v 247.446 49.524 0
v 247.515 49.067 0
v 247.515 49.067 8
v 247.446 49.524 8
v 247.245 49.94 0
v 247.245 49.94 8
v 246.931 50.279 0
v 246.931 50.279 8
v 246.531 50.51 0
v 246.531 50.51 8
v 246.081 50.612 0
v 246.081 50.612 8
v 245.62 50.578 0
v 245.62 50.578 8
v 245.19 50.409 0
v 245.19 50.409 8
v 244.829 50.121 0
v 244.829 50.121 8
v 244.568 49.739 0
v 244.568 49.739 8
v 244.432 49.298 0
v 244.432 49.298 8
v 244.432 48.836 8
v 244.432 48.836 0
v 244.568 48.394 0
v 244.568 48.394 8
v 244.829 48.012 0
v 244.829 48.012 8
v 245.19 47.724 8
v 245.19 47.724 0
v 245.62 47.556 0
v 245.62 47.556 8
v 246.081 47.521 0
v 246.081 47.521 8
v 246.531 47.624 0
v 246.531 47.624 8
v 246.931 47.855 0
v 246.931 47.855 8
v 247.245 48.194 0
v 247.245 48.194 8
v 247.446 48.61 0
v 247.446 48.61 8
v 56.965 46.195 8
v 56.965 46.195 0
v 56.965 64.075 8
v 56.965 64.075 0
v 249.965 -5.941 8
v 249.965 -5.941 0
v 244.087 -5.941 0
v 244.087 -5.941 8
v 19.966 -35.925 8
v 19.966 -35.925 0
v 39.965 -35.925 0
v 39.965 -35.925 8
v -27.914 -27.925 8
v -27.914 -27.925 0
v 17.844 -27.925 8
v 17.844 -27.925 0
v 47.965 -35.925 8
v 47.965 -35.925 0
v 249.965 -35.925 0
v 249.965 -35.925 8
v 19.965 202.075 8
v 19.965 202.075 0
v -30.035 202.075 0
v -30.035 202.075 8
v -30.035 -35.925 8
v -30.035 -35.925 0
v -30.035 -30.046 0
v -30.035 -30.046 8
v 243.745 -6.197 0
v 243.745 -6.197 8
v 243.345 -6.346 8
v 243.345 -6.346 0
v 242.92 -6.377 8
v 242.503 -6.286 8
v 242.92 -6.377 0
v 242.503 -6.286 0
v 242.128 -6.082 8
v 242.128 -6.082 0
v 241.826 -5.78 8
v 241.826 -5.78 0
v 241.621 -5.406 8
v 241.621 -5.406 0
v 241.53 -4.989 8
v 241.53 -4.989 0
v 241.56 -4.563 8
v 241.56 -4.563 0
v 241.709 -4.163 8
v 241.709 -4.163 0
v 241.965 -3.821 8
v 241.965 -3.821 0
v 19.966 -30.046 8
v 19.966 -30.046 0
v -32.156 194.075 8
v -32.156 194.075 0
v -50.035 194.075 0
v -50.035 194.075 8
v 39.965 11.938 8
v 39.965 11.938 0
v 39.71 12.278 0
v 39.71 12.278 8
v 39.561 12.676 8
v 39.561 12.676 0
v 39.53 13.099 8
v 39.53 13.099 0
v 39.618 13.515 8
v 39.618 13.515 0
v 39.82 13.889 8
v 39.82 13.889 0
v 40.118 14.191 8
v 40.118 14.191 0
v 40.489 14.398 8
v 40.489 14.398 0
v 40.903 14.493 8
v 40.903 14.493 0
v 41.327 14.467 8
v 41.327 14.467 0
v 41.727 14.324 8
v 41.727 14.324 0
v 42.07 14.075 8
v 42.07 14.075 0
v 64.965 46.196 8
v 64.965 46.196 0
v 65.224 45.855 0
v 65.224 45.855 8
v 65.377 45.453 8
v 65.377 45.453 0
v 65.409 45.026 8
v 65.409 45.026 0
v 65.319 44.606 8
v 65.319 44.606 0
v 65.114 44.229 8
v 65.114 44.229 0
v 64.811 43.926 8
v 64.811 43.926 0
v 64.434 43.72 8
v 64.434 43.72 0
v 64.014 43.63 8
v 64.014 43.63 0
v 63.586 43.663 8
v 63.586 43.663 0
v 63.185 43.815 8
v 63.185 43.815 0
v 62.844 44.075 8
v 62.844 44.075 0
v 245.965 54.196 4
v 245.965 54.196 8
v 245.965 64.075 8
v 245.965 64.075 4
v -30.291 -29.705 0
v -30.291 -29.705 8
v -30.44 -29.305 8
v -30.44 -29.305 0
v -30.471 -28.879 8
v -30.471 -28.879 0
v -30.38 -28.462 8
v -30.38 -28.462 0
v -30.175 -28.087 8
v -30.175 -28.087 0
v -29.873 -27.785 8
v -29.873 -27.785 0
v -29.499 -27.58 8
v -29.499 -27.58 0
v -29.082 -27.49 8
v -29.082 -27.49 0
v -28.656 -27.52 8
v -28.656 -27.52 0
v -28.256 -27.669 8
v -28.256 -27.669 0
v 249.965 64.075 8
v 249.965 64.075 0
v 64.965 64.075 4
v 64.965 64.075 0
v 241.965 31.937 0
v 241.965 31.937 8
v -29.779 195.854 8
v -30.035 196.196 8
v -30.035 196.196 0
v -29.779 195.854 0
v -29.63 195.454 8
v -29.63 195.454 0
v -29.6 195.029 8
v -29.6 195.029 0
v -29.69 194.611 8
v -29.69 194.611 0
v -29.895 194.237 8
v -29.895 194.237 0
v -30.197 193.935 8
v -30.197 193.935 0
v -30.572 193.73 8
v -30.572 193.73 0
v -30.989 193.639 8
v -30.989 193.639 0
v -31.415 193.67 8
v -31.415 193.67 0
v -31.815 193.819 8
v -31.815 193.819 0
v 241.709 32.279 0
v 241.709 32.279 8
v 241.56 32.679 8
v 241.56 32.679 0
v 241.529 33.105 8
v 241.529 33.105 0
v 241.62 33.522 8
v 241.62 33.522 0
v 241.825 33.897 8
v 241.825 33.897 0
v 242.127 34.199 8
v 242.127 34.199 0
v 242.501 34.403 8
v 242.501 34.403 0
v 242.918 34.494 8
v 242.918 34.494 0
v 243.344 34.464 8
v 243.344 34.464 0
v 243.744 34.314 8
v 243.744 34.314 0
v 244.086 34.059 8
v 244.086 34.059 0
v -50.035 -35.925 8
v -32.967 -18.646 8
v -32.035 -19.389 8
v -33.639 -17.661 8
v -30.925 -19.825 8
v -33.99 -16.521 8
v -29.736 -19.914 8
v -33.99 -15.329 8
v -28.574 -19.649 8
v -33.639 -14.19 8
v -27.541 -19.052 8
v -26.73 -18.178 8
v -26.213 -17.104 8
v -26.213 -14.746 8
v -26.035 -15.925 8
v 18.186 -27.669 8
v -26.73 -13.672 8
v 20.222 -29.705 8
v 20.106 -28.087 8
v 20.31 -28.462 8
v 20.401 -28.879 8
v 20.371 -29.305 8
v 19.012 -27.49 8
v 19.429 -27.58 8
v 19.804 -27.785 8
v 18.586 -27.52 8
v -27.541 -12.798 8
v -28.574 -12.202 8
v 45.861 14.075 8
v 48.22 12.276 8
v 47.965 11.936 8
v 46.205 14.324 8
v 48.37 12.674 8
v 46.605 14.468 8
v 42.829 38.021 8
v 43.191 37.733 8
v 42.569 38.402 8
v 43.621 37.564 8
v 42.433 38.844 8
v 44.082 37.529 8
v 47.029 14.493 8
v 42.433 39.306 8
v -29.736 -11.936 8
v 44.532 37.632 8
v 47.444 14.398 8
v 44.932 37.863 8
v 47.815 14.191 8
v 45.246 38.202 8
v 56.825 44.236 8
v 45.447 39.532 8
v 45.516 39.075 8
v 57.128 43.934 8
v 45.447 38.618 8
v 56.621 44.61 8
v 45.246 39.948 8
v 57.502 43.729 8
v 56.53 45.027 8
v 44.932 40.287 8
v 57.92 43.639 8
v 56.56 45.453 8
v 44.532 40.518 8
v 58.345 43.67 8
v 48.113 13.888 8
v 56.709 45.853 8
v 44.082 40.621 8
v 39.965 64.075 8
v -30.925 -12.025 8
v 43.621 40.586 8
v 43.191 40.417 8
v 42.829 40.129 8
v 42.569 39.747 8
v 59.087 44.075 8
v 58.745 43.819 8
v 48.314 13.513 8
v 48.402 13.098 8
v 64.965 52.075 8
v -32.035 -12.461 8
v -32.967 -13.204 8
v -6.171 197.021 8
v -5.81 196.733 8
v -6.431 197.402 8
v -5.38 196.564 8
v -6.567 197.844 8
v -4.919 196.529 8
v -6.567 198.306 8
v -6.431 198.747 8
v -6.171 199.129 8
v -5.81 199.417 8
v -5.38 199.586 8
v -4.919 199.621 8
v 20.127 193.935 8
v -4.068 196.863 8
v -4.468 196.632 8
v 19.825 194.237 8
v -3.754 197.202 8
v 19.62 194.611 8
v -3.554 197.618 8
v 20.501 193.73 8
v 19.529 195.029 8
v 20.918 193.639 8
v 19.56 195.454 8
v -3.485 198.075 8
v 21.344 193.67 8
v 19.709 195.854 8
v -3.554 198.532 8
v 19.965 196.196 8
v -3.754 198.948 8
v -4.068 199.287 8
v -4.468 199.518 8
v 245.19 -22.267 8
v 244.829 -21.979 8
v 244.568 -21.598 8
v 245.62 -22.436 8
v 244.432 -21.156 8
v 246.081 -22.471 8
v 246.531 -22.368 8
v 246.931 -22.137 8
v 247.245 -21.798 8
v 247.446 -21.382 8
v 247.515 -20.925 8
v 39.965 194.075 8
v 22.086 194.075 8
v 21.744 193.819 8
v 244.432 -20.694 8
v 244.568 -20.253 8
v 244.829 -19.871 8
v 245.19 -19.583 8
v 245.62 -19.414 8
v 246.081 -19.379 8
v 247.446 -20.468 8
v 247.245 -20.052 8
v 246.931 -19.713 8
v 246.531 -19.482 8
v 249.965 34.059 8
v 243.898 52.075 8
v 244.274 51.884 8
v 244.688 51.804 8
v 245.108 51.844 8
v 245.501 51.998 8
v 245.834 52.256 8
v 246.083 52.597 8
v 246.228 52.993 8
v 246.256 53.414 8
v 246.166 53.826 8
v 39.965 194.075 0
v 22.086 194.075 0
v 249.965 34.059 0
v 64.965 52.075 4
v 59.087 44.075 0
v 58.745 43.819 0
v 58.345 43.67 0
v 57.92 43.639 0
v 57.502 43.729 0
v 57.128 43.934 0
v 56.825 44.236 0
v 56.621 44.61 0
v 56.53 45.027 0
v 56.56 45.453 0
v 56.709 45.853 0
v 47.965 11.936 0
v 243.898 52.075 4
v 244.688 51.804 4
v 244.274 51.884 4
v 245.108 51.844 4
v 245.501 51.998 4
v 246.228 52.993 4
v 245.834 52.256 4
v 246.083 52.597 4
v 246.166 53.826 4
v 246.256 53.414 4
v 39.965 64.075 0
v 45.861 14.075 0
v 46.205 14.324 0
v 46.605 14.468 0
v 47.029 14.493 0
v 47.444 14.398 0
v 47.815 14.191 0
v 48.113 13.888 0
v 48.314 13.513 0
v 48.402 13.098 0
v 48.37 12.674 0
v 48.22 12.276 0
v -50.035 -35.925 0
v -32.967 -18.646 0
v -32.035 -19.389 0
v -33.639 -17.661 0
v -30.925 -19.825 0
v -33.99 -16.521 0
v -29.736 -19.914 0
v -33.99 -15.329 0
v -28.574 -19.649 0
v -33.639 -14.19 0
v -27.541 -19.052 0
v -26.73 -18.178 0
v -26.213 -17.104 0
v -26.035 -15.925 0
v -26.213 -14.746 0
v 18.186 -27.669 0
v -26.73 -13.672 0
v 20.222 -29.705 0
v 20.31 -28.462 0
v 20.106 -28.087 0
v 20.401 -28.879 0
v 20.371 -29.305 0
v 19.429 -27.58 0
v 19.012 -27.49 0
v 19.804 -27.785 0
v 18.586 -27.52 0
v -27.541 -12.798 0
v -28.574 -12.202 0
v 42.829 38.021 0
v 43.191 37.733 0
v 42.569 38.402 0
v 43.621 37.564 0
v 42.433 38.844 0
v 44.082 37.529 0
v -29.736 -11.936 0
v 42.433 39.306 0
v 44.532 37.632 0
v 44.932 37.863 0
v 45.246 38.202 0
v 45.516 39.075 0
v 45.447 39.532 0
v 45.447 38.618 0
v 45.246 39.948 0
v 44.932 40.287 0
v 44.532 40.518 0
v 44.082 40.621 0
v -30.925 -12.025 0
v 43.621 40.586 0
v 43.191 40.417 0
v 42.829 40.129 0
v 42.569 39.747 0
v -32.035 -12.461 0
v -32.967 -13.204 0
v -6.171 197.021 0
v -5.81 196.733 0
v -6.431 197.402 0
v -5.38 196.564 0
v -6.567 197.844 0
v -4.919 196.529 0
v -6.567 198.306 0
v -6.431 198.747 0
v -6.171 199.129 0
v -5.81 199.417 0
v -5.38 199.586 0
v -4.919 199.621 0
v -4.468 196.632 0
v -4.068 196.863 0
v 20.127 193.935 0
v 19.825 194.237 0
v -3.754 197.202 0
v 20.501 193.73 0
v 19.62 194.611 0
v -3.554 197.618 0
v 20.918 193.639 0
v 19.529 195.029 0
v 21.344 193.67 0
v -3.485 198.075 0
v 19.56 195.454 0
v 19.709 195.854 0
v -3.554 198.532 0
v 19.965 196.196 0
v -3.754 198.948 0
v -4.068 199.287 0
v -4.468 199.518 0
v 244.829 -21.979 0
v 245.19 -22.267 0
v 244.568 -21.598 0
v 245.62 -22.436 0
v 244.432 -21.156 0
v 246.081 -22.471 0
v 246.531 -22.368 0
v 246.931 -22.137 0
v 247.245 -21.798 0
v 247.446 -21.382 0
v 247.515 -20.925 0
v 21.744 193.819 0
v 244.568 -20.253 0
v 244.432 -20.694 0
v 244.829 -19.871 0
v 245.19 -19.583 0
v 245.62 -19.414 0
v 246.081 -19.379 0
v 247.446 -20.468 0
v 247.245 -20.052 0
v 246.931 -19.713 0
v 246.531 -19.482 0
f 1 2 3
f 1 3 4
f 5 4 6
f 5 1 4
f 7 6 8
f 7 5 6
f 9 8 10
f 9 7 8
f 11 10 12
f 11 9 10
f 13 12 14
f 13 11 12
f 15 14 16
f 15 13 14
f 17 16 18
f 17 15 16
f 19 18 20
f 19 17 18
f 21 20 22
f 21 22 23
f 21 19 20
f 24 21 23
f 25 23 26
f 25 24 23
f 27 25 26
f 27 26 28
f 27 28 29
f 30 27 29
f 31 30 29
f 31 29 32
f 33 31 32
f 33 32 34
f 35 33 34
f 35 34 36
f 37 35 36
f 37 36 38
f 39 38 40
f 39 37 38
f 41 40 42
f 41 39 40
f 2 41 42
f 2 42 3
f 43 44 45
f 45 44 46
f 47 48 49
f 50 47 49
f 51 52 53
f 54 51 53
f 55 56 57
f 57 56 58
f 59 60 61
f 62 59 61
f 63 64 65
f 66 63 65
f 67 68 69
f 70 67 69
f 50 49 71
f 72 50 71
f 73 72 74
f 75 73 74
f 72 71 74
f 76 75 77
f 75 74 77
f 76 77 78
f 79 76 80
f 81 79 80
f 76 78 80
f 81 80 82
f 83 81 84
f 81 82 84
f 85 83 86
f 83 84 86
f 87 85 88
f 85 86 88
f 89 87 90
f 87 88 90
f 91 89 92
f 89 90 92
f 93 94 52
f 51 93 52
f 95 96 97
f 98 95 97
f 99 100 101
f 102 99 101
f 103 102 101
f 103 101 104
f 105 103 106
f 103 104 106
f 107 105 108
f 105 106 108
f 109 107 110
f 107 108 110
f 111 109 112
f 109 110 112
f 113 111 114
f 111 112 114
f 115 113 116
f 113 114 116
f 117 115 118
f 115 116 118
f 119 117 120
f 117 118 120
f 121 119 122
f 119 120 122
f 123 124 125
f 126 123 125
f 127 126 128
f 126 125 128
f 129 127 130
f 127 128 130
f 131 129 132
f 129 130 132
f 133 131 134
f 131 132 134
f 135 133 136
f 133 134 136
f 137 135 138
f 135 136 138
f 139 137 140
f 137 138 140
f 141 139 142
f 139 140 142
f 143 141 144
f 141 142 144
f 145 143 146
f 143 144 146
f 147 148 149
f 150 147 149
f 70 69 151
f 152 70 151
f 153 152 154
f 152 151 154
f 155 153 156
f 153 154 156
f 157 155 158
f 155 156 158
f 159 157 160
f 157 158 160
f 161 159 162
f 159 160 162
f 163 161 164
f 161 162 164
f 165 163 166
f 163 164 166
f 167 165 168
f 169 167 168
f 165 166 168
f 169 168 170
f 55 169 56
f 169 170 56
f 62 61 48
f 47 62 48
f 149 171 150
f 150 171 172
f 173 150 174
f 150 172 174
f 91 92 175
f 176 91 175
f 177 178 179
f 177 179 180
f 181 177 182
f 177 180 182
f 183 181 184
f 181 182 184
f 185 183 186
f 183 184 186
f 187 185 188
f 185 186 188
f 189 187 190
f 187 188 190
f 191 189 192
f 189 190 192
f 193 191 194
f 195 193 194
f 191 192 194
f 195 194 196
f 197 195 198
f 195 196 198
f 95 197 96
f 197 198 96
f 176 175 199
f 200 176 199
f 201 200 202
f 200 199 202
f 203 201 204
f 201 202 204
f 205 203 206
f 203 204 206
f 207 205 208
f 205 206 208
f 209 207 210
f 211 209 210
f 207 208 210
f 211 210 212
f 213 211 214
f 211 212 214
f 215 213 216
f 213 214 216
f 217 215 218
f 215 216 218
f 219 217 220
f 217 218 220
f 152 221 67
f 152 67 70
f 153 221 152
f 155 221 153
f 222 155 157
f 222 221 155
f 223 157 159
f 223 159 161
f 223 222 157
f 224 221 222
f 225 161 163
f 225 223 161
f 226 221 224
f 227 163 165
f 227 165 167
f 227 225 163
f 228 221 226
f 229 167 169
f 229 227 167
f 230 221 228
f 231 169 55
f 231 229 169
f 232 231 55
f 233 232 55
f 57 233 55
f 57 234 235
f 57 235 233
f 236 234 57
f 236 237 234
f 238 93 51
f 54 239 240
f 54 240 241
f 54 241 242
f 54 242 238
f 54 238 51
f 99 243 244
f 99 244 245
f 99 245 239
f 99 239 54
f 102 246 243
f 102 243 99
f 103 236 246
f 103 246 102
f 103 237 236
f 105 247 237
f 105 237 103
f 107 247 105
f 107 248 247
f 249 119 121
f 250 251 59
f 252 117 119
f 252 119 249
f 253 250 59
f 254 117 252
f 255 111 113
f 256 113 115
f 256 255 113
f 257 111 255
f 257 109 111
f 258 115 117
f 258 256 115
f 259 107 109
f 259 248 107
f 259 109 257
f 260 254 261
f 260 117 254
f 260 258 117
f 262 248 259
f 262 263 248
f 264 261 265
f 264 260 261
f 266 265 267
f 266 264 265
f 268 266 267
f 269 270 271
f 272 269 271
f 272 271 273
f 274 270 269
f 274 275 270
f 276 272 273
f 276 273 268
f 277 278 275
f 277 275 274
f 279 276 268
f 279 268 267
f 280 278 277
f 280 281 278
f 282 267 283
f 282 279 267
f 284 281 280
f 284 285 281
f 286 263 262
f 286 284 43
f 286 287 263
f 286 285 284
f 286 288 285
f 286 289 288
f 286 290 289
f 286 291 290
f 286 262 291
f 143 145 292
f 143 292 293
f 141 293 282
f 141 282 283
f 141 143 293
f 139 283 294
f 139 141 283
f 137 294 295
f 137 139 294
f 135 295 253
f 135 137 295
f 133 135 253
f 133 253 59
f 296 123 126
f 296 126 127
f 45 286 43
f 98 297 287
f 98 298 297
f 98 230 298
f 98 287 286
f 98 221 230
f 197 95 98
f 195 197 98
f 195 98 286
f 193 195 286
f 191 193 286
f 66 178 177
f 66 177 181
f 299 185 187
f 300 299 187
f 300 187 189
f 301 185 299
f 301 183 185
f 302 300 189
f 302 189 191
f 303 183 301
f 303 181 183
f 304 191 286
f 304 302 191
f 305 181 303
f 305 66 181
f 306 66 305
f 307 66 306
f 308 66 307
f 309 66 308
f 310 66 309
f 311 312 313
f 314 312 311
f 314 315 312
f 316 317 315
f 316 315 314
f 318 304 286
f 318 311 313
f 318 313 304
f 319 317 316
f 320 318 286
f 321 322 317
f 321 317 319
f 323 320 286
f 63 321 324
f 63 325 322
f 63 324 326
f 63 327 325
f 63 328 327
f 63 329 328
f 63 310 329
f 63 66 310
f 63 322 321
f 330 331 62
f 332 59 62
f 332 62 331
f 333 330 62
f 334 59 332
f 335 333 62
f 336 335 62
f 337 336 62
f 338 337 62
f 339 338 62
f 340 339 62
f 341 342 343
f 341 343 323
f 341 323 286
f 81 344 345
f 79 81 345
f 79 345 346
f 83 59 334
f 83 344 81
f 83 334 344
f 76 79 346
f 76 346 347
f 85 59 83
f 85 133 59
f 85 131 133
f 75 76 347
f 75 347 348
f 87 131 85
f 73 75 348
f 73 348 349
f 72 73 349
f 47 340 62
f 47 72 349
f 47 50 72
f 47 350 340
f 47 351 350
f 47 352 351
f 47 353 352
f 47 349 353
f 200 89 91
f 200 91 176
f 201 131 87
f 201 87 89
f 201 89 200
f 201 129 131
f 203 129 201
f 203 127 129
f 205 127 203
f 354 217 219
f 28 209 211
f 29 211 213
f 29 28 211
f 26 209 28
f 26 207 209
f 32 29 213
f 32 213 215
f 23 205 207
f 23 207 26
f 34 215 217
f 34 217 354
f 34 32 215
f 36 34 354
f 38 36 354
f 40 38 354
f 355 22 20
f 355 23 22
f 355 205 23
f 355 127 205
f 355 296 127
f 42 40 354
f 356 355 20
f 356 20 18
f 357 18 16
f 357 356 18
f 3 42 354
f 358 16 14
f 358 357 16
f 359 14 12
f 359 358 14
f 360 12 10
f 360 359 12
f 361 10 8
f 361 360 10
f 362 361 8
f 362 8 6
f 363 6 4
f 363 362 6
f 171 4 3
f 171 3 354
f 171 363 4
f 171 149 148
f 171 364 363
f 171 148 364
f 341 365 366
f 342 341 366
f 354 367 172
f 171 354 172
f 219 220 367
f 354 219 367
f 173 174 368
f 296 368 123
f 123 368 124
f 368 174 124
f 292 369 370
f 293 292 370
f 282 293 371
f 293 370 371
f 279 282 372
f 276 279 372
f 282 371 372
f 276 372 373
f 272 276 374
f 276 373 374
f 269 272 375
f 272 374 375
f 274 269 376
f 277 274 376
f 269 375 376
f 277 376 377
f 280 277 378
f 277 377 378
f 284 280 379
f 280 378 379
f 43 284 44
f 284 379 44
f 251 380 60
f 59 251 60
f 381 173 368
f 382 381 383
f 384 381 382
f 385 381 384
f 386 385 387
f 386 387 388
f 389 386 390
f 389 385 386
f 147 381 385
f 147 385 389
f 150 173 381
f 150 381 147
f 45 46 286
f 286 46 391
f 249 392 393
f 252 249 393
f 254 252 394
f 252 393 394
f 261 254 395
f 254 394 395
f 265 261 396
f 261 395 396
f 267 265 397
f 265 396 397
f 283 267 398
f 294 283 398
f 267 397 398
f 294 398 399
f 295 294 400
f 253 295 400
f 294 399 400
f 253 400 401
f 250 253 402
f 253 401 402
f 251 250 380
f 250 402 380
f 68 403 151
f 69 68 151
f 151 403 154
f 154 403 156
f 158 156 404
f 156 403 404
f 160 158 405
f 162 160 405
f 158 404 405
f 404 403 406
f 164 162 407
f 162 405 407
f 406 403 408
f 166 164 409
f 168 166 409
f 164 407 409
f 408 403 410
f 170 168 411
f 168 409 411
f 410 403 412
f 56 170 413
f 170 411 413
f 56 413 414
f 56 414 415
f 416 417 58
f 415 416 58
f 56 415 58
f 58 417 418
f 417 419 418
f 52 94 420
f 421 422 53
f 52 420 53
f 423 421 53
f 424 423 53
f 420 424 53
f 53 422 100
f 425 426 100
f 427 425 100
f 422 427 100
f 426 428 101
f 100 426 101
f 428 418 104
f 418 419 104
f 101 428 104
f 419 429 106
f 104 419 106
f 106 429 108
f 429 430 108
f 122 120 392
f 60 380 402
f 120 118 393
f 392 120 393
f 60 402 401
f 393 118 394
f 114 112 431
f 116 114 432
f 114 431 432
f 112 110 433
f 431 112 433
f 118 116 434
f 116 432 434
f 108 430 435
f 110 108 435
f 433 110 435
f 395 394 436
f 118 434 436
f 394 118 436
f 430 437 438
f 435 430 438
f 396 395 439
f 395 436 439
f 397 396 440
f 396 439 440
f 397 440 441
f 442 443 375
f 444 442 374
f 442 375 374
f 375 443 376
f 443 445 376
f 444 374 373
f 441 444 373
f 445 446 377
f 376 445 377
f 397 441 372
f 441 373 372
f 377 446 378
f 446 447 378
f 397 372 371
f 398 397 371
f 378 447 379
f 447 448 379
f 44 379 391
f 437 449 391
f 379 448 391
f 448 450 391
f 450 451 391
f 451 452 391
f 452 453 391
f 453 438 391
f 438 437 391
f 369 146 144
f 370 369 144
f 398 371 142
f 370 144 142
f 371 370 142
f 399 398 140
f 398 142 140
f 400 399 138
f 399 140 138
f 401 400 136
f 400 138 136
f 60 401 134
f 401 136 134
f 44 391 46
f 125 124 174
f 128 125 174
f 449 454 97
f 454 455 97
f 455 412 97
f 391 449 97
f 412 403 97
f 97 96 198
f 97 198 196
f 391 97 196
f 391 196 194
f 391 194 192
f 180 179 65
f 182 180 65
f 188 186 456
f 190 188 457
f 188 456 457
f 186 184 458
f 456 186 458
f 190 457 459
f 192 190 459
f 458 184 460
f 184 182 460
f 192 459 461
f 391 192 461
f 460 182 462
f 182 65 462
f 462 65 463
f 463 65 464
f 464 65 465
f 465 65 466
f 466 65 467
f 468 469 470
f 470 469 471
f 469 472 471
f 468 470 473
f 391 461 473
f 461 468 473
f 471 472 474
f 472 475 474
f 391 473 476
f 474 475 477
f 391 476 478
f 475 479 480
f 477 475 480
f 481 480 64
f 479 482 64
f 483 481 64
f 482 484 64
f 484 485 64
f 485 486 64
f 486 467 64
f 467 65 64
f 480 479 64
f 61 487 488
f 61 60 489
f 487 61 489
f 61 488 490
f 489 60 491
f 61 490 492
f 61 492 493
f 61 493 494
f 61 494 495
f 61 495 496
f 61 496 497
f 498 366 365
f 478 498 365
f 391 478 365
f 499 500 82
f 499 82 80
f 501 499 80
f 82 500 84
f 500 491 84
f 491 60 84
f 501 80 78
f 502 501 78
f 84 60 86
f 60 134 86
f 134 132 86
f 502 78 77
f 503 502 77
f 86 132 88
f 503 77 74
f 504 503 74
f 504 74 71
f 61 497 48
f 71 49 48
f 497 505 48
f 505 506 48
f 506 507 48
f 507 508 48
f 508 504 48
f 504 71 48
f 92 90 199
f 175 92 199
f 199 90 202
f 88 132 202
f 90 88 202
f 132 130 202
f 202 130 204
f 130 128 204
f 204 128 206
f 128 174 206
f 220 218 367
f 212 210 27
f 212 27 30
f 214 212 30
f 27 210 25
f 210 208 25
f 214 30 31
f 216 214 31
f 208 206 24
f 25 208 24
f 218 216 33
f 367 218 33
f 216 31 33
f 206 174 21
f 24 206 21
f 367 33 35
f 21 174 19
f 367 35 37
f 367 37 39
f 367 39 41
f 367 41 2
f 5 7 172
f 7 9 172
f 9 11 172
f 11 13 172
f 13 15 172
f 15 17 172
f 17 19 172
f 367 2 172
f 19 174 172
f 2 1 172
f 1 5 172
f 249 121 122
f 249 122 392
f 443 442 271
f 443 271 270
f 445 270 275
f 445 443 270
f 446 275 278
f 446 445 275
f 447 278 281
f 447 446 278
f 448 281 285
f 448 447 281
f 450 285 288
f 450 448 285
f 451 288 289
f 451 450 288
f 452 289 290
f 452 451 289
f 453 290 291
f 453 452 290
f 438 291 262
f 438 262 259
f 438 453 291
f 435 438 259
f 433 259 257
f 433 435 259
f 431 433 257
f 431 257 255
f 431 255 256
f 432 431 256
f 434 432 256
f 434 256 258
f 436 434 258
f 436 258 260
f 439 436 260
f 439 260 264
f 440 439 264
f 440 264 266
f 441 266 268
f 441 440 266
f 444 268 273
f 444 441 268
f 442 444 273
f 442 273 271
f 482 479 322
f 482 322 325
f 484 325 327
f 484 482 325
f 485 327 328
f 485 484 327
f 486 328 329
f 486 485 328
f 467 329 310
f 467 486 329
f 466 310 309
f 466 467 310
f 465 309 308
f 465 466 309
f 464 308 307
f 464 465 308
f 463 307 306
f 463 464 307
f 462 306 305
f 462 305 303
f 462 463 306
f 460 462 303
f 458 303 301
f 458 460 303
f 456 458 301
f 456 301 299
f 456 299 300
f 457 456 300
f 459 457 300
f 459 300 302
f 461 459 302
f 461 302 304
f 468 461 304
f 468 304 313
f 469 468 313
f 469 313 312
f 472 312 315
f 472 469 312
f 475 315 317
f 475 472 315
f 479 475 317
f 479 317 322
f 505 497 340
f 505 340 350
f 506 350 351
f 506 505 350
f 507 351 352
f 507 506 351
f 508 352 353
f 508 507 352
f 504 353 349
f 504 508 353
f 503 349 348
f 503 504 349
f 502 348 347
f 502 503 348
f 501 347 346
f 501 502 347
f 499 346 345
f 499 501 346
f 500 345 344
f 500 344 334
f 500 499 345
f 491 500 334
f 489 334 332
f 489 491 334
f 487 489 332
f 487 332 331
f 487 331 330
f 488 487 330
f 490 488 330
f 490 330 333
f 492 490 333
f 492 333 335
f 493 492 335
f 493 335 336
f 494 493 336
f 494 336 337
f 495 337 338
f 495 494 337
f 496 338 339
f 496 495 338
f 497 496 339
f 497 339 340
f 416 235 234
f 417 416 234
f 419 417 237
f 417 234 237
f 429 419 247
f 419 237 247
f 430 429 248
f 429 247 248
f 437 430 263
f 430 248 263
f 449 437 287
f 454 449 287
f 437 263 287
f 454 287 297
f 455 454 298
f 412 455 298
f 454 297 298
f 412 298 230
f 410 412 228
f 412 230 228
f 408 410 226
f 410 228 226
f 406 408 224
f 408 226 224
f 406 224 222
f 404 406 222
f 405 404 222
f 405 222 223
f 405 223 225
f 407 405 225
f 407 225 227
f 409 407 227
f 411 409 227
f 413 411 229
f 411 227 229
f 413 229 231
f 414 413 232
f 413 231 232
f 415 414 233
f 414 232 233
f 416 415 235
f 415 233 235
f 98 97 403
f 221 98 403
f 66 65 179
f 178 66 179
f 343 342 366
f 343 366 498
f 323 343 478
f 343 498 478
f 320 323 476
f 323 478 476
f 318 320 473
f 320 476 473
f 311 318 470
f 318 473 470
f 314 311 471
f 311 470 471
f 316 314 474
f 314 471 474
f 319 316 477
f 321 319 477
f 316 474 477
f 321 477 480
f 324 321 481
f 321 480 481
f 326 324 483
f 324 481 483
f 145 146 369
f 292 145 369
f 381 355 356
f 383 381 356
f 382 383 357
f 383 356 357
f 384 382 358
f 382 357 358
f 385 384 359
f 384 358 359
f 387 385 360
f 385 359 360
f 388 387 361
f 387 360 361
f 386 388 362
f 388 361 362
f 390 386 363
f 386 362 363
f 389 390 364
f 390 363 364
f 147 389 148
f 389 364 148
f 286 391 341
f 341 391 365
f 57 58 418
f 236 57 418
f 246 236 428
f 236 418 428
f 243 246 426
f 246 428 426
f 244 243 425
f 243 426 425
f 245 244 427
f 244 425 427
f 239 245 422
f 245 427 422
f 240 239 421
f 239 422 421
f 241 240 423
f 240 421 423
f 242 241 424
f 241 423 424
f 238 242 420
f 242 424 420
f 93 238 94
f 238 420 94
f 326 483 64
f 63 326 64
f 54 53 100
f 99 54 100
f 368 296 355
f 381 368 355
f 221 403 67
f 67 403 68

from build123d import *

# Parameters (mm, degrees)
ESQUISSE1_R             = 1.55
BOSS_EXTRU_1_DEPTH      = 8
ENL_V_MAT_EXTRU_1_DEPTH = 4
ESQUISSE3_R             = 4
ENL_V_MAT_EXTRU_2_DEPTH = 8


with BuildPart() as part:
    # Esquisse1 → Boss.-Extru.1 (new body)
    with BuildSketch(Plane.XY):
        with BuildLine():
            Line((-50.035172564, 24.058527132), (-50.035172564, -35.925114983))
            Line((-50.035172564, -35.925114983), (-30.035172564, -35.925114983))
            Line((-30.035172564, -35.925114983), (-30.035172564, -30.046435327))
            ThreePointArc((-30.035172564, -30.046435327), (-30.035172564, -27.925114983), (-27.913852221, -27.925114983))
            Line((-27.913852221, -27.925114983), (17.844379825, -27.925114983))
            ThreePointArc((17.844379825, -27.925114983), (19.965700169, -27.925114983), (19.965700169, -30.046435327))
            Line((19.965700169, -30.046435327), (19.965700169, -35.925114983))
            Line((19.965700169, -35.925114983), (39.964827436, -35.925114983))
            Line((39.964827436, -35.925114983), (39.964827436, 11.93808024))
            ThreePointArc((39.964827436, 11.93808024), (39.957922176, 14.050691679), (42.070406367, 14.074885017))
            Line((42.070406367, 14.074885017), (45.86099397, 14.074885017))
            ThreePointArc((45.86099397, 14.074885017), (47.974344085, 14.04981219), (47.964827436, 11.936334773))
            Line((47.964827436, 11.936334773), (47.964827436, -35.925114983))
            Line((47.964827436, -35.925114983), (249.964827436, -35.925114983))
            Line((249.964827436, -35.925114983), (249.964827436, -5.941472868))
            Line((249.964827436, -5.941472868), (244.087020512, -5.941472868))
            ThreePointArc((244.087020512, -5.941472868), (241.966136804, -5.941909324), (241.964827436, -3.821025976))
            Line((241.964827436, -3.821025976), (241.964827436, 31.937207148))
            ThreePointArc((241.964827436, 31.937207148), (241.964827616, 34.058527312), (244.086147779, 34.058527132))
            Line((244.086147779, 34.058527132), (249.964827436, 34.058527132))
            Line((249.964827436, 34.058527132), (249.964827436, 64.074885017))
            Line((249.964827436, 64.074885017), (64.964827436, 64.074885017))
            Line((64.964827436, 64.074885017), (64.964827436, 46.19620536))
            ThreePointArc((64.964827436, 46.19620536), (64.973452157, 44.066397786), (62.843644031, 44.074885017))
            Line((62.843644031, 44.074885017), (59.087020512, 44.074885017))
            ThreePointArc((59.087020512, 44.074885017), (56.965700528, 44.074011925), (56.964827436, 46.195331909))
            Line((56.964827436, 46.195331909), (56.964827436, 64.074885017))
            Line((56.964827436, 64.074885017), (39.964827436, 64.074885017))
            Line((39.964827436, 64.074885017), (39.964827436, 194.074885017))
            Line((39.964827436, 194.074885017), (22.086147779, 194.074885017))
            ThreePointArc((22.086147779, 194.074885017), (19.964827436, 194.074885017), (19.964827436, 196.19620536))
            Line((19.964827436, 196.19620536), (19.964827436, 202.074885017))
            Line((19.964827436, 202.074885017), (-30.035172564, 202.074885017))
            Line((-30.035172564, 202.074885017), (-30.035172564, 196.19620536))
            ThreePointArc((-30.035172564, 196.19620536), (-30.035172564, 194.074885017), (-32.156492908, 194.074885017))
            Line((-32.156492908, 194.074885017), (-50.035172564, 194.074885017))
            Line((-50.035172564, 194.074885017), (-50.035172564, 24.058527132))
        make_face()
        with Locations((43.965700169, 39.074885017)):
            Circle(ESQUISSE1_R, mode=Mode.SUBTRACT)
        with Locations((-5.034736198, 198.074885017)):
            Circle(ESQUISSE1_R, mode=Mode.SUBTRACT)
        with Locations((245.964827436, -20.925114983)):
            Circle(ESQUISSE1_R, mode=Mode.SUBTRACT)
        with Locations((245.964827481, 49.066706209)):
            Circle(ESQUISSE1_R, mode=Mode.SUBTRACT)
    extrude(amount=BOSS_EXTRU_1_DEPTH)

    # Esquisse2 → Enlèv. mat.-Extru.1 (cut)
    with BuildSketch(Plane.XY.offset(8)):
        with BuildLine():
            Line((60.964827436, 52.074885017), (243.898356115, 52.074885017))
            ThreePointArc((243.898356115, 52.074885017), (245.834400808, 52.256079256), (245.964827436, 54.19620536))
            Line((245.964827436, 54.19620536), (245.964827436, 64.074885017))
            Line((245.964827436, 64.074885017), (60.964827436, 64.074885017))
            Line((60.964827436, 64.074885017), (60.964827436, 52.074885017))
        make_face()
    extrude(amount=-ENL_V_MAT_EXTRU_1_DEPTH, mode=Mode.SUBTRACT)

    # Esquisse3 → Enlèv. mat.-Extru.2 (cut)
    with BuildSketch(Plane.XY.offset(8)):
        with Locations((-30.035172564, -15.925114983)):
            Circle(ESQUISSE3_R)
    extrude(amount=-ENL_V_MAT_EXTRU_2_DEPTH, mode=Mode.SUBTRACT)


solid = part.part
